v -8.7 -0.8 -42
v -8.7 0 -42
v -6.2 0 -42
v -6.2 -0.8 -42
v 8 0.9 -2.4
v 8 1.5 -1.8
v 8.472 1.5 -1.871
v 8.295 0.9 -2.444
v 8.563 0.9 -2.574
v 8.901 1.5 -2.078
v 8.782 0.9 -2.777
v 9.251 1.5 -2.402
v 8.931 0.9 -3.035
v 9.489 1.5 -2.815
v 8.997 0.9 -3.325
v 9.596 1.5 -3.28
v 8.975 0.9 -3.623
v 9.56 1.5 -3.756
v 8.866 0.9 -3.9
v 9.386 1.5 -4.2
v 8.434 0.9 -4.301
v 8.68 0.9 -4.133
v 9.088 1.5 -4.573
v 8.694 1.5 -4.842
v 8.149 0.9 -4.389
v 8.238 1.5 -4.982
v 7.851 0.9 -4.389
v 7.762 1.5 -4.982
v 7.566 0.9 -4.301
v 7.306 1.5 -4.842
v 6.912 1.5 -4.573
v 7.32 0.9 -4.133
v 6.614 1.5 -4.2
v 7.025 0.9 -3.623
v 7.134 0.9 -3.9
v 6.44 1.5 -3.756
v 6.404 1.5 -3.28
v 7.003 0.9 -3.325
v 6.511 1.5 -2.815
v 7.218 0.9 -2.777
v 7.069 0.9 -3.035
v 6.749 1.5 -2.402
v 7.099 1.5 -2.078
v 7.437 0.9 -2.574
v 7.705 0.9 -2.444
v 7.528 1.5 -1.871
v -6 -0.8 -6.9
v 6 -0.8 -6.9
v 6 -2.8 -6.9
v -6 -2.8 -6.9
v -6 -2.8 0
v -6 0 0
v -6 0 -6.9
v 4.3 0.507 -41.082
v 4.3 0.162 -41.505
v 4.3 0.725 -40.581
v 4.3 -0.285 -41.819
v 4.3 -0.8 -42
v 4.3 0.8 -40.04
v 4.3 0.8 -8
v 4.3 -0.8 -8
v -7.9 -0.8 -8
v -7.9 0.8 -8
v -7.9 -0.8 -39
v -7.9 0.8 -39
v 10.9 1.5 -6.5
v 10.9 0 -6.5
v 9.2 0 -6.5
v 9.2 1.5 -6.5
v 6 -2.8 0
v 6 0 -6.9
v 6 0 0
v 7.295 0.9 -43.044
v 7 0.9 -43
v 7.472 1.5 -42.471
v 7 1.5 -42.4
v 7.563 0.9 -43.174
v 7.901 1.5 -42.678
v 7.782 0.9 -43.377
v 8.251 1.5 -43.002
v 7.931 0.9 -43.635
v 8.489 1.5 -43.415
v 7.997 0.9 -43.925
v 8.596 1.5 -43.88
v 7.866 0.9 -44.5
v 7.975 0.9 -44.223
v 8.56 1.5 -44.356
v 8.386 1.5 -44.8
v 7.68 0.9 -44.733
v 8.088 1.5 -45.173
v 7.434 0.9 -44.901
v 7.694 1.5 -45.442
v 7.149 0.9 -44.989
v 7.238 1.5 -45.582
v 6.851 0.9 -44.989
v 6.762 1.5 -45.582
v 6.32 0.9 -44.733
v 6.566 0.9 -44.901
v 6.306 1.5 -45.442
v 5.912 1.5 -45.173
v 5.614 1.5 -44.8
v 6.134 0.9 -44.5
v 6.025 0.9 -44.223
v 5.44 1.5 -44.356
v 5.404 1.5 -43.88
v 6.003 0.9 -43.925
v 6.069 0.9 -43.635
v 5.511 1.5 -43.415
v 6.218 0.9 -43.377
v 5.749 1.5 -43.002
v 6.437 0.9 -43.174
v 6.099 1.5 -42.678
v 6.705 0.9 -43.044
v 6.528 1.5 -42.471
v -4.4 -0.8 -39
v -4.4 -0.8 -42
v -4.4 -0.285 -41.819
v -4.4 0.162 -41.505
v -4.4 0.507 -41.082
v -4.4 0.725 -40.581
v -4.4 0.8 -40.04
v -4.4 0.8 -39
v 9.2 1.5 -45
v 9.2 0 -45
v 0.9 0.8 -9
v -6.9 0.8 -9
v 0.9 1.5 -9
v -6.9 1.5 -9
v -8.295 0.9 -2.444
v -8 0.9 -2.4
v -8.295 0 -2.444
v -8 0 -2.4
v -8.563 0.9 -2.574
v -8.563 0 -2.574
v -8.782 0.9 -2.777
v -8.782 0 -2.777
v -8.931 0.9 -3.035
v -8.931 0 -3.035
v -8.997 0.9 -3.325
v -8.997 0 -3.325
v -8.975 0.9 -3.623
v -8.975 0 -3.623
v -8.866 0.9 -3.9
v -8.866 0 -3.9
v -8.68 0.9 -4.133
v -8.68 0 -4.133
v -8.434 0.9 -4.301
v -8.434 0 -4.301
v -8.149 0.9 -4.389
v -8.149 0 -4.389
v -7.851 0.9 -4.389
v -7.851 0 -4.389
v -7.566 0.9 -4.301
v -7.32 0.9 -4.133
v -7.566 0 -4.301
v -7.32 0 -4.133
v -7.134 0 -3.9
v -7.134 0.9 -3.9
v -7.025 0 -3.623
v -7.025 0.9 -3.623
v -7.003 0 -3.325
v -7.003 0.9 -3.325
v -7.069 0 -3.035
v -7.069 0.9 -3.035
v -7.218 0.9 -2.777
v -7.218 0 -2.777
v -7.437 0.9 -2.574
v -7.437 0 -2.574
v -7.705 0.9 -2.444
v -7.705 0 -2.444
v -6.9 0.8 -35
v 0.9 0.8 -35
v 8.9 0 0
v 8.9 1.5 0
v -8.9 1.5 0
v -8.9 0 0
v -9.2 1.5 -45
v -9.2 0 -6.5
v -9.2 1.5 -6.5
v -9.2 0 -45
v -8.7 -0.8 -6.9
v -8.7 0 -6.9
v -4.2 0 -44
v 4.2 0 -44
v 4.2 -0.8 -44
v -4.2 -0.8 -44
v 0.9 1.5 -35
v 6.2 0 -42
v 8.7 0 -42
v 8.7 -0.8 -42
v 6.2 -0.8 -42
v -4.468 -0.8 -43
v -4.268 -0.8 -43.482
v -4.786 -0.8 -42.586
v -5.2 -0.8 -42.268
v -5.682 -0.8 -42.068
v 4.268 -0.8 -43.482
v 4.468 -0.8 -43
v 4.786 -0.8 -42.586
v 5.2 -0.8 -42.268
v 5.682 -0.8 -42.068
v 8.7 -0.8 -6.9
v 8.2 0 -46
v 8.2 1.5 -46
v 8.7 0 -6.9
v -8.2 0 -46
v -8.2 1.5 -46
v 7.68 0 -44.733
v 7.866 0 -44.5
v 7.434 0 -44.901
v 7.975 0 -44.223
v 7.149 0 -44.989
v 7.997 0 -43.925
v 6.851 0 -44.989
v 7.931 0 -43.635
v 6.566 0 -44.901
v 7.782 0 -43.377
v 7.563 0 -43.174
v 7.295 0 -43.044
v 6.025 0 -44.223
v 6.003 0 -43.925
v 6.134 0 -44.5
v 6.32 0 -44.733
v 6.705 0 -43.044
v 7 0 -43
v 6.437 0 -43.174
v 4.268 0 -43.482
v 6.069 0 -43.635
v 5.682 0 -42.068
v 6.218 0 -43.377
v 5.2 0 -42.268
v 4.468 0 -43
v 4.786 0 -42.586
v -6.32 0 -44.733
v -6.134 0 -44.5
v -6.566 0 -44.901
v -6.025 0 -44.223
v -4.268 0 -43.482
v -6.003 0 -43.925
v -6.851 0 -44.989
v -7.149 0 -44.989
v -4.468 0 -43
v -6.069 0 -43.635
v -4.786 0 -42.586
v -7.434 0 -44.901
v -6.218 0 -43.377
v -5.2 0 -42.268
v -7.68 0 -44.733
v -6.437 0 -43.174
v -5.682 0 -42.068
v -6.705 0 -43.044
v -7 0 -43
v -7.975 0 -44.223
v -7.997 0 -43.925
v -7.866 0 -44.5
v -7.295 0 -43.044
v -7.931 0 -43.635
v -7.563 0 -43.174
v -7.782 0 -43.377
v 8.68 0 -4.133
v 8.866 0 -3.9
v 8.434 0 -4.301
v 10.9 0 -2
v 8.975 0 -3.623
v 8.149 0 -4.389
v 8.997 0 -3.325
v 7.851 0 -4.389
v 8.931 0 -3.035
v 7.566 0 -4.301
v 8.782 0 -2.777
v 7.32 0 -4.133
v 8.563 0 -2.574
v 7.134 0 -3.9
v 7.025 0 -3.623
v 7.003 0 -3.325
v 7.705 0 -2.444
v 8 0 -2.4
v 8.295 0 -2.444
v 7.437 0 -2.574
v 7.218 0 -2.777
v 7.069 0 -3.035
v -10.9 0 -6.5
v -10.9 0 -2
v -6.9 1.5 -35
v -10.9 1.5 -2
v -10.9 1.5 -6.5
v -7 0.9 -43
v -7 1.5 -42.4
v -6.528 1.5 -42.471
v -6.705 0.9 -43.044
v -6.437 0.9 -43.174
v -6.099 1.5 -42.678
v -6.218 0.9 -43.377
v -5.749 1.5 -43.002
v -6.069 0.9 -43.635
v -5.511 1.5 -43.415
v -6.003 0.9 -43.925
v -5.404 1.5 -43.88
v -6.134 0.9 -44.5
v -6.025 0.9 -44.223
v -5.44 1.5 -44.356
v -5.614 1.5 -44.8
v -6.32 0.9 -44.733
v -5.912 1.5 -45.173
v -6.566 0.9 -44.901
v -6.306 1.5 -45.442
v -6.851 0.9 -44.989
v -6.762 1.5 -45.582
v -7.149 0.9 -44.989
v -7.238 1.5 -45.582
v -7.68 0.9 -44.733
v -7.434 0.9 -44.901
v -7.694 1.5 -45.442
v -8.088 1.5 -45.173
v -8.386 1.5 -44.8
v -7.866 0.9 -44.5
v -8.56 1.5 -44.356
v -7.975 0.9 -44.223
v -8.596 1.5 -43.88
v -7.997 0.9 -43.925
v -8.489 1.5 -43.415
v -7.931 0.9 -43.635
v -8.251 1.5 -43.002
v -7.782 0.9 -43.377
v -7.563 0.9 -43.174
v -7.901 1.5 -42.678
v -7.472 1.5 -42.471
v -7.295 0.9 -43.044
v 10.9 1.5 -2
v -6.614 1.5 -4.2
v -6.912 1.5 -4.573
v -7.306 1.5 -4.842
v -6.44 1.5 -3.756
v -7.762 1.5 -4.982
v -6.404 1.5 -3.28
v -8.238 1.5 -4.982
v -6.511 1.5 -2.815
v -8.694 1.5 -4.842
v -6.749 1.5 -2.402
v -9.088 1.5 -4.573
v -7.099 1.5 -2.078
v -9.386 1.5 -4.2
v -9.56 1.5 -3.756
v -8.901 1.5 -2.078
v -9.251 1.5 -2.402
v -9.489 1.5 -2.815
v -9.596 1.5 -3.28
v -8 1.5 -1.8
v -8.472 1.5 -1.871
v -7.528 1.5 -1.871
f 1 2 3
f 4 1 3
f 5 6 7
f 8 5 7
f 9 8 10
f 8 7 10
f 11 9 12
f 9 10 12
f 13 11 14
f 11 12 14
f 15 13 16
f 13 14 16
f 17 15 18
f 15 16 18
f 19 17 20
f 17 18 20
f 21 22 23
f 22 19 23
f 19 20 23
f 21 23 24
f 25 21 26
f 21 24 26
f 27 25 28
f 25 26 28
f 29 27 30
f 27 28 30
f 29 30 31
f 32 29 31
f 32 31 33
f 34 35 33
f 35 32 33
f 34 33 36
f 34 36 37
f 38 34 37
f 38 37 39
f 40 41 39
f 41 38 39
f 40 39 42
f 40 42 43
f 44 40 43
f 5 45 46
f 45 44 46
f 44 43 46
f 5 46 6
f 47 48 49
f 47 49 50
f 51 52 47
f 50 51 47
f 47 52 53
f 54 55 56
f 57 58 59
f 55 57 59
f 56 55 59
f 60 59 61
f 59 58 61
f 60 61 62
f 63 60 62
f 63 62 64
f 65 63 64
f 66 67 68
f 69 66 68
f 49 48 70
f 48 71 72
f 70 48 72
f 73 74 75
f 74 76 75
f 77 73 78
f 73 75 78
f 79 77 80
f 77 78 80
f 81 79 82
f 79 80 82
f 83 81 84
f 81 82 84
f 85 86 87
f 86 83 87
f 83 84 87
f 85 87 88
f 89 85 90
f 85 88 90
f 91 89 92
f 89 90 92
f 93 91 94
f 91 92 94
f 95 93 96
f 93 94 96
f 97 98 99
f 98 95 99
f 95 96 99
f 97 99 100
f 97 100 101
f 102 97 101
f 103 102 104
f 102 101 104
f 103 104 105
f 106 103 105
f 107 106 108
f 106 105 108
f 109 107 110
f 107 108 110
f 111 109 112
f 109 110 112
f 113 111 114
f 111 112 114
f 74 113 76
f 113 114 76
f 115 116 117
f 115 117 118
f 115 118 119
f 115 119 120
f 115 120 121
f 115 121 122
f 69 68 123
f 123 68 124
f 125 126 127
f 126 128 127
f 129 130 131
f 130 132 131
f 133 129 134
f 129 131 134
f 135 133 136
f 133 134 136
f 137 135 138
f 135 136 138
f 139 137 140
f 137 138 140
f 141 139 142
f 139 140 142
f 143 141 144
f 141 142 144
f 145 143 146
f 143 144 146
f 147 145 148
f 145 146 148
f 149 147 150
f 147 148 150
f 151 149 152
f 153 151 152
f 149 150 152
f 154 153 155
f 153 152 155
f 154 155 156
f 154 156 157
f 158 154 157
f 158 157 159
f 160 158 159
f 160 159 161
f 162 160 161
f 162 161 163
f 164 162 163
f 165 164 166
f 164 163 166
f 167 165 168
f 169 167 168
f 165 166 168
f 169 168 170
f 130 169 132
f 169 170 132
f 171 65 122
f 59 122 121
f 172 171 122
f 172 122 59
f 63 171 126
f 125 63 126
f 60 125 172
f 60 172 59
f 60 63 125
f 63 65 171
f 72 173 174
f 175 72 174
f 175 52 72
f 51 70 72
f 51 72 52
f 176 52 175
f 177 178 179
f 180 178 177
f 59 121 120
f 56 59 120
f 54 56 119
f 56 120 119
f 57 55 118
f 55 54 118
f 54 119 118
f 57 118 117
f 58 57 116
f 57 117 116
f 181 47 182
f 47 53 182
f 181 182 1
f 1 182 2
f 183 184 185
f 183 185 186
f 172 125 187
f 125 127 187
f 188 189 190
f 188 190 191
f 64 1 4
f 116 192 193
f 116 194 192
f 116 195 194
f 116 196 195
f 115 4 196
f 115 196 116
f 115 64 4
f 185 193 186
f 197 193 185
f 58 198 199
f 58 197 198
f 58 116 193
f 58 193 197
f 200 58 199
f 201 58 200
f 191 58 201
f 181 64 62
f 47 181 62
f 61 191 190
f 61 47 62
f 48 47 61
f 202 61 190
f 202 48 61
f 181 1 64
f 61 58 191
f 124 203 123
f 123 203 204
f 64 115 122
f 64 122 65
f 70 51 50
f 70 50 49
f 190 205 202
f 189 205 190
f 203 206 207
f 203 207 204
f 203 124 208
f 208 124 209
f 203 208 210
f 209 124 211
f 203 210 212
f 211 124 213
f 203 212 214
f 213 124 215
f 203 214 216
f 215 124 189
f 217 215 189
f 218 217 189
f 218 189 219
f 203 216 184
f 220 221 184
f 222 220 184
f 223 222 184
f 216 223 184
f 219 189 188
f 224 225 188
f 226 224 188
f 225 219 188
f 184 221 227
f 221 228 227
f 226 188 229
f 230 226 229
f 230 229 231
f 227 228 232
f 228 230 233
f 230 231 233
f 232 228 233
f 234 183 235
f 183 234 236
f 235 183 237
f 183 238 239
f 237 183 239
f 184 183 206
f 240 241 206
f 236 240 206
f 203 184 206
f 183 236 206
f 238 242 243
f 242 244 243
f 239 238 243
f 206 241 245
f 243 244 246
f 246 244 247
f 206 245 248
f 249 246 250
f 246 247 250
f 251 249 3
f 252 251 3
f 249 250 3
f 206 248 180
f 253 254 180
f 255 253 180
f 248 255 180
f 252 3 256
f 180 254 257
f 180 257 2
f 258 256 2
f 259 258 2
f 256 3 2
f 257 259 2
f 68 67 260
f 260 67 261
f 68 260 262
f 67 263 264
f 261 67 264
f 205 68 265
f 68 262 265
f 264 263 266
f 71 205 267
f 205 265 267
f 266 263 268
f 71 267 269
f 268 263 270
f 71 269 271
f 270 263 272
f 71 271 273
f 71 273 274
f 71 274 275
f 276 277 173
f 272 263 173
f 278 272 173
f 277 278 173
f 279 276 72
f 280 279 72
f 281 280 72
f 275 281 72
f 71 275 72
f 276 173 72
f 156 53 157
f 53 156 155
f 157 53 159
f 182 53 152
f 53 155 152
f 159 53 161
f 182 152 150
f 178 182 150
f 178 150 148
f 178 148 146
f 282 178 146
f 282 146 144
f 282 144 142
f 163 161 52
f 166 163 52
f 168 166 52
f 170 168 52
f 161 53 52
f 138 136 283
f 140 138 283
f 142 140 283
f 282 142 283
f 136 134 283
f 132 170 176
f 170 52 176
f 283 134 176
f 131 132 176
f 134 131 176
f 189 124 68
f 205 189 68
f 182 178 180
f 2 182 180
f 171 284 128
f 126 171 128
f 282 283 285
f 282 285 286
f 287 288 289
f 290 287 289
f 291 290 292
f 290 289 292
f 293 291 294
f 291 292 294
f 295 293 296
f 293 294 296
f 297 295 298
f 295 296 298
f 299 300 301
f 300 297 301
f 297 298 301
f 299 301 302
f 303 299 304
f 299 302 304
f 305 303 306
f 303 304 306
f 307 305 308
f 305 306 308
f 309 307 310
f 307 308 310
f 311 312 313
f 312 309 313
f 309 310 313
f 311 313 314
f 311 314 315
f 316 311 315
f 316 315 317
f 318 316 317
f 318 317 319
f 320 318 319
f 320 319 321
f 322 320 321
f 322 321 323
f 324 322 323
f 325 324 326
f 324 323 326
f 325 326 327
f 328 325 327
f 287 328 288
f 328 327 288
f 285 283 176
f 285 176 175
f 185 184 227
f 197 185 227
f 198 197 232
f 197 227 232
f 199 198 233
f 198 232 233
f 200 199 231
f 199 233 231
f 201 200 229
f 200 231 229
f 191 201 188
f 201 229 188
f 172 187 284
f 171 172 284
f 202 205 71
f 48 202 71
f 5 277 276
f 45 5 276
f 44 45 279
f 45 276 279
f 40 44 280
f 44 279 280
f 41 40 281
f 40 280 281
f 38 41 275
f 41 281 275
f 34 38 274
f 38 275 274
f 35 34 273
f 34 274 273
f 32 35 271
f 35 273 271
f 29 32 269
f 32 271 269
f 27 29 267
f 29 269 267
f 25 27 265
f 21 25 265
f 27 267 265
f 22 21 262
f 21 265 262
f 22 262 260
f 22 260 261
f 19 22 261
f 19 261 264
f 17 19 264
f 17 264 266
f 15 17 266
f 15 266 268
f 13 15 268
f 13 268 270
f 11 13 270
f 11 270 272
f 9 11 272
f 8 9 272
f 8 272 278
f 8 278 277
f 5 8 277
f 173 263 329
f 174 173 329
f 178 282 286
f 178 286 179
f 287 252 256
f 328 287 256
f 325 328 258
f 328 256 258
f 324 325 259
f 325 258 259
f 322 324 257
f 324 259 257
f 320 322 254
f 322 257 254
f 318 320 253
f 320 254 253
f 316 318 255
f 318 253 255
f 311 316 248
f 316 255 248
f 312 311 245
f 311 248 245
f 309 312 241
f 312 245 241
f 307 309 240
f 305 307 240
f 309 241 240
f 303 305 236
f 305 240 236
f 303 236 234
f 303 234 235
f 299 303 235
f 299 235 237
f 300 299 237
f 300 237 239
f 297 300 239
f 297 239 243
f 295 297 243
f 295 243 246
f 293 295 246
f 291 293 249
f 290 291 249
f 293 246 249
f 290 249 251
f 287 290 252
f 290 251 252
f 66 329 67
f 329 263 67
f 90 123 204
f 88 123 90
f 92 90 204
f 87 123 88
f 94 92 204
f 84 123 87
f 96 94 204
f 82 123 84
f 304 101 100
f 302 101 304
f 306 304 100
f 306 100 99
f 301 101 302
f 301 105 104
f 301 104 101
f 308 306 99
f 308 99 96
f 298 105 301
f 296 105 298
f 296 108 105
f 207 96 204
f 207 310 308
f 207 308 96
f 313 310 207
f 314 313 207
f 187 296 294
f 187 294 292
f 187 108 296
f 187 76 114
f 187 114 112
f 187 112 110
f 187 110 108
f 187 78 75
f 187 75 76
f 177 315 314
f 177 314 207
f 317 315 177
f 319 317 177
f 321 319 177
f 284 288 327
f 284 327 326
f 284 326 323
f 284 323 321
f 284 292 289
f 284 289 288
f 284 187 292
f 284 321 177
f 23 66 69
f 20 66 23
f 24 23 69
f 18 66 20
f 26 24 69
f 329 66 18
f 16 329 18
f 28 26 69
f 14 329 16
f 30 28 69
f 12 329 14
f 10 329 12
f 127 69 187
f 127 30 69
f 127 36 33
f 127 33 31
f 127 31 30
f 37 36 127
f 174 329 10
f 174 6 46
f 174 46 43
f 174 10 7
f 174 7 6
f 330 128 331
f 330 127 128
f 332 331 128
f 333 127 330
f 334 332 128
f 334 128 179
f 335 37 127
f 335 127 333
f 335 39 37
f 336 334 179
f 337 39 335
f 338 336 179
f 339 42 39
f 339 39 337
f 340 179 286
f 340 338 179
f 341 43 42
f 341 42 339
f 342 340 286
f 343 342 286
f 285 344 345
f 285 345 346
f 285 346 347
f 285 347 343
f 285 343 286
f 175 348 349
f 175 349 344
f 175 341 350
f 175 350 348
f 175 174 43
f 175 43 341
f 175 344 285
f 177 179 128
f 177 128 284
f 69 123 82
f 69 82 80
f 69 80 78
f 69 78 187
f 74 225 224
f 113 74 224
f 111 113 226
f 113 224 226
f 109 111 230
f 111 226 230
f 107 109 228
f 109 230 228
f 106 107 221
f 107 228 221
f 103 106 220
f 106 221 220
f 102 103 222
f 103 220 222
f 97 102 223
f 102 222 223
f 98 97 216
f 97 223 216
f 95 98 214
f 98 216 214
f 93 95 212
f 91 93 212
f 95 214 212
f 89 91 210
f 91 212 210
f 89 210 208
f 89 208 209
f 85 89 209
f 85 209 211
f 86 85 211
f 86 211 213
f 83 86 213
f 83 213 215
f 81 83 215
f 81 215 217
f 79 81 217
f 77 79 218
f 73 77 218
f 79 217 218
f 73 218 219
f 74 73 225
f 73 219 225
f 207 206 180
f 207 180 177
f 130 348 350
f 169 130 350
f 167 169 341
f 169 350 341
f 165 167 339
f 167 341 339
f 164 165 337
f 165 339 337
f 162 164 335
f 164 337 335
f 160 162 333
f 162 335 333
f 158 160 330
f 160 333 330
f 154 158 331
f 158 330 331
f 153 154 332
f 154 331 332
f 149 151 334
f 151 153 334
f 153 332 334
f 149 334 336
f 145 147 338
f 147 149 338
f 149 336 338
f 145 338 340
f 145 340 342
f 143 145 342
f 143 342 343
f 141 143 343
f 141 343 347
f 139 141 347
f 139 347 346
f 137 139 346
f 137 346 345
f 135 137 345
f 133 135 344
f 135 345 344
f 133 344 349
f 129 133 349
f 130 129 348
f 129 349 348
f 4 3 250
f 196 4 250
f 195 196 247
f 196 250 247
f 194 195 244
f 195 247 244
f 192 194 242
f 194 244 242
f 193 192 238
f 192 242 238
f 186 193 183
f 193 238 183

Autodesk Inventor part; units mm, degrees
ref_plane "YZ Plane" through (0, 0, 0) normal (1, 0, 0) x (0, 1, 0)
ref_plane "XZ Plane" through (0, 0, 0) normal (0, 1, 0) x (-1, 0, 0)
ref_plane "XY Plane" through (0, 0, 0) normal (0, 0, 1) x (1, 0, 0)
sketch "Эскиз1" plane through (0, 0, 0) normal (0, 1, 0) x (-1, 0, 0)
  line L0 (0, 0) -> (0, -46)
  line L1 (0, 0) -> (10.9, 0)
  line L2 (10.9, 0) -> (10.9, -6.5)
  line L3 (10.9, -6.5) -> (9.2, -6.5)
  line L4 (9.2, -6.5) -> (9.2, -46)
  line L5 (9.2, -46) -> (0, -46)
  line L6 (0, 0) -> (-10.9, 0)
  line L7 (-10.9, 0) -> (-10.9, -6.5)
  line L8 (-10.9, -6.5) -> (-9.2, -6.5)
  line L9 (-9.2, -6.5) -> (-9.2, -46)
  line L10 (-9.2, -46) -> (0, -46)
  dimension "d1" = 6.5
  dimension "d2" = 46
  dimension "d3" = 18.4
  dimension "d4" = 21.8
extrude "Выдавливание1" add sketch "Эскиз1" along normal blind 1.5
chamfer "Фаска1" distance 2 angle 45 2 edges at (10.9, 0.75, 0) (-10.9, 0.75, 0)
chamfer "Фаска2" distance 1 angle 45 2 edges at (9.2, 0.75, -46) (-9.2, 0.75, -46)
sketch "Эскиз2" plane through (0, 1.5, 0) normal (0, 1, 0) x (1, 0, 0)
  line L0 (0, 0) -> (0, 46)
  line L1 (8.2, 46) -> (-8.2, 46) projected
  line L2 (-8.9, 0) -> (8.9, 0) projected
  point P0 (-8, 3.4)
  point P1 (8, 3.4)
  point P2 (-7, 44)
  point P3 (7, 44)
  dimension "d20" = 3.4
  dimension "d21" = 16
  dimension "d22" = 14
  dimension "d23" = 44
hole "Отверстие1" at (-8, 1.5, -3.4) at (8, 1.5, -3.4) at (-7, 1.5, -44) at (7, 1.5, -44) direction (0, -1, 0) diameter 2 end through all countersink diameter 3.2 countersink angle 90
sketch "Эскиз3" plane through (0, 0, 0) normal (0, -1, 0) x (1, 0, 0)
  line L0 (8.7, -6.9) -> (0, -6.9)
  line L1 (-8.9, 0) -> (8.9, 0) projected
  line L2 (8.7, -6.9) -> (8.7, -42)
  line L3 (10.9, -2) -> (10.9, -6.5) projected
  line L4 (8.7, -42) -> (6.2, -42)
  line L5 (4.2, -44) -> (4.2, -44)
  line L6 (4.2, -44) -> (0, -44)
  line L7 (8.7, -6.9) -> (5.8, -6.9)
  line L8 (0, 0) -> (0, -46)
  line L9 (8.2, -46) -> (-8.2, -46) projected
  arc A0 (6.2, -42) -> (4.2, -44) centre (6.2, -44) ccw
  line L10 (-8.7, -6.9) -> (0, -6.9)
  line L11 (-8.7, -6.9) -> (-8.7, -42)
  line L12 (-8.7, -42) -> (-6.2, -42)
  line L13 (-4.2, -44) -> (-4.2, -44)
  line L14 (-4.2, -44) -> (0, -44)
  line L15 (-8.7, -6.9) -> (-5.8, -6.9)
  arc A1 (-4.2, -44) -> (-6.2, -42) centre (-6.2, -44) ccw
  circle A2 centre (-7, -44) radius 1 projected
  circle A3 centre (-8, -3.4) radius 1 projected
  circle A4 centre (8, -3.4) radius 1 projected
  circle A5 centre (7, -44) radius 1 projected
  line L16 (-8.2, -46) -> (-9.2, -45) projected
  line L17 (8.2, -46) -> (-8.2, -46) projected
  line L18 (9.2, -45) -> (8.2, -46) projected
  line L19 (9.2, -6.5) -> (9.2, -45) projected
  line L20 (10.9, -6.5) -> (9.2, -6.5) projected
  line L21 (10.9, -2) -> (10.9, -6.5) projected
  line L22 (8.9, 0) -> (10.9, -2) projected
  line L23 (-8.9, 0) -> (8.9, 0) projected
  line L24 (-10.9, -2) -> (-8.9, 0) projected
  line L25 (-10.9, -6.5) -> (-10.9, -2) projected
  line L26 (-9.2, -6.5) -> (-10.9, -6.5) projected
  line L27 (-9.2, -45) -> (-9.2, -6.5) projected
  dimension "d24" = 6.9
  dimension "d25" = 2.2
  dimension "d26" = 42
  dimension "d27" = 44
  dimension "d28" = 6.7
  dimension "d30" = 2
extrude "Выдавливание2" add sketch "Эскиз3" along normal blind 0.8 contours L2 L4 A0 L6 L8 L0 | L8 L14 A1 L12 L11 L10
sketch "Эскиз5" plane through (0, -0.8, 0) normal (0, -1, 0) x (1, 0, 0)
  line L0 (-7.9, -42) -> (4.3, -42)
  line L1 (4.3, -42) -> (4.3, -8)
  line L2 (4.3, -8) -> (-7.9, -8)
  line L3 (-7.9, -8) -> (-7.9, -42)
  line L4 (-10.9, -6.5) -> (-10.9, -2) projected
  line L5 (9.2, -6.5) -> (9.2, -45) projected
  line L6 (-8.9, 0) -> (8.9, 0) projected
  line L7 (8.2, -46) -> (-8.2, -46) projected
  line L8 (-4.4, -42) -> (-4.4, -39)
  line L9 (-4.4, -39) -> (-7.9, -39)
  point P0 (0, 0)
  dimension "d33" = 3
  dimension "d35" = 8
  dimension "d36" = 4
  dimension "d40" = 31
  dimension "d41" = 3.5
  dimension "d55" = 12.2
extrude "Выдавливание3" cut sketch "Эскиз5" against normal blind 1.6 contours L8 L9 L3 L2 L1 L0
sketch "Эскиз6" plane through (0, 1.5, 0) normal (0, 1, 0) x (1, 0, 0)
  line L0 (-6.9, 9) -> (0.9, 9)
  line L1 (0.9, 9) -> (0.9, 35)
  line L2 (0.9, 35) -> (-6.9, 35)
  line L3 (-6.9, 35) -> (-6.9, 9)
  line L4 (-8.9, 0) -> (8.9, 0) projected
  line L5 (-9.2, 45) -> (-9.2, 6.5) projected
  line L6 (-10.9, 6.5) -> (-10.9, 2) projected
  line L7 (10.9, 2) -> (10.9, 6.5) projected
  point P0 (0, 0)
  dimension "d43" = 9
  dimension "d45" = 4
  dimension "d46" = 10
  dimension "d47" = 26
extrude "Выдавливание4" cut sketch "Эскиз6" against normal through all
fillet "Сопряжение2" radius 2 1 edges at (-0.05, 0.8, -42)
sketch "Эскиз7" plane through (0, 0, 0) normal (0, -1, 0) x (1, 0, 0)
  line L0 (-8.9, 0) -> (8.9, 0) projected
  line L1 (8.7, -6.9) -> (-8.7, -6.9) projected
  line L2 (6, 0) -> (-6, 0)
  line L3 (-6, 0) -> (-6, -6.9)
  line L4 (-6, -6.9) -> (6, -6.9)
  line L5 (6, -6.9) -> (6, 0)
  point P0 (0, 0)
  point P1 (0, 0)
  dimension "d51" = 12
extrude "Выдавливание5" add sketch "Эскиз7" along normal blind 2.8
properties part number "Case_top_new"
